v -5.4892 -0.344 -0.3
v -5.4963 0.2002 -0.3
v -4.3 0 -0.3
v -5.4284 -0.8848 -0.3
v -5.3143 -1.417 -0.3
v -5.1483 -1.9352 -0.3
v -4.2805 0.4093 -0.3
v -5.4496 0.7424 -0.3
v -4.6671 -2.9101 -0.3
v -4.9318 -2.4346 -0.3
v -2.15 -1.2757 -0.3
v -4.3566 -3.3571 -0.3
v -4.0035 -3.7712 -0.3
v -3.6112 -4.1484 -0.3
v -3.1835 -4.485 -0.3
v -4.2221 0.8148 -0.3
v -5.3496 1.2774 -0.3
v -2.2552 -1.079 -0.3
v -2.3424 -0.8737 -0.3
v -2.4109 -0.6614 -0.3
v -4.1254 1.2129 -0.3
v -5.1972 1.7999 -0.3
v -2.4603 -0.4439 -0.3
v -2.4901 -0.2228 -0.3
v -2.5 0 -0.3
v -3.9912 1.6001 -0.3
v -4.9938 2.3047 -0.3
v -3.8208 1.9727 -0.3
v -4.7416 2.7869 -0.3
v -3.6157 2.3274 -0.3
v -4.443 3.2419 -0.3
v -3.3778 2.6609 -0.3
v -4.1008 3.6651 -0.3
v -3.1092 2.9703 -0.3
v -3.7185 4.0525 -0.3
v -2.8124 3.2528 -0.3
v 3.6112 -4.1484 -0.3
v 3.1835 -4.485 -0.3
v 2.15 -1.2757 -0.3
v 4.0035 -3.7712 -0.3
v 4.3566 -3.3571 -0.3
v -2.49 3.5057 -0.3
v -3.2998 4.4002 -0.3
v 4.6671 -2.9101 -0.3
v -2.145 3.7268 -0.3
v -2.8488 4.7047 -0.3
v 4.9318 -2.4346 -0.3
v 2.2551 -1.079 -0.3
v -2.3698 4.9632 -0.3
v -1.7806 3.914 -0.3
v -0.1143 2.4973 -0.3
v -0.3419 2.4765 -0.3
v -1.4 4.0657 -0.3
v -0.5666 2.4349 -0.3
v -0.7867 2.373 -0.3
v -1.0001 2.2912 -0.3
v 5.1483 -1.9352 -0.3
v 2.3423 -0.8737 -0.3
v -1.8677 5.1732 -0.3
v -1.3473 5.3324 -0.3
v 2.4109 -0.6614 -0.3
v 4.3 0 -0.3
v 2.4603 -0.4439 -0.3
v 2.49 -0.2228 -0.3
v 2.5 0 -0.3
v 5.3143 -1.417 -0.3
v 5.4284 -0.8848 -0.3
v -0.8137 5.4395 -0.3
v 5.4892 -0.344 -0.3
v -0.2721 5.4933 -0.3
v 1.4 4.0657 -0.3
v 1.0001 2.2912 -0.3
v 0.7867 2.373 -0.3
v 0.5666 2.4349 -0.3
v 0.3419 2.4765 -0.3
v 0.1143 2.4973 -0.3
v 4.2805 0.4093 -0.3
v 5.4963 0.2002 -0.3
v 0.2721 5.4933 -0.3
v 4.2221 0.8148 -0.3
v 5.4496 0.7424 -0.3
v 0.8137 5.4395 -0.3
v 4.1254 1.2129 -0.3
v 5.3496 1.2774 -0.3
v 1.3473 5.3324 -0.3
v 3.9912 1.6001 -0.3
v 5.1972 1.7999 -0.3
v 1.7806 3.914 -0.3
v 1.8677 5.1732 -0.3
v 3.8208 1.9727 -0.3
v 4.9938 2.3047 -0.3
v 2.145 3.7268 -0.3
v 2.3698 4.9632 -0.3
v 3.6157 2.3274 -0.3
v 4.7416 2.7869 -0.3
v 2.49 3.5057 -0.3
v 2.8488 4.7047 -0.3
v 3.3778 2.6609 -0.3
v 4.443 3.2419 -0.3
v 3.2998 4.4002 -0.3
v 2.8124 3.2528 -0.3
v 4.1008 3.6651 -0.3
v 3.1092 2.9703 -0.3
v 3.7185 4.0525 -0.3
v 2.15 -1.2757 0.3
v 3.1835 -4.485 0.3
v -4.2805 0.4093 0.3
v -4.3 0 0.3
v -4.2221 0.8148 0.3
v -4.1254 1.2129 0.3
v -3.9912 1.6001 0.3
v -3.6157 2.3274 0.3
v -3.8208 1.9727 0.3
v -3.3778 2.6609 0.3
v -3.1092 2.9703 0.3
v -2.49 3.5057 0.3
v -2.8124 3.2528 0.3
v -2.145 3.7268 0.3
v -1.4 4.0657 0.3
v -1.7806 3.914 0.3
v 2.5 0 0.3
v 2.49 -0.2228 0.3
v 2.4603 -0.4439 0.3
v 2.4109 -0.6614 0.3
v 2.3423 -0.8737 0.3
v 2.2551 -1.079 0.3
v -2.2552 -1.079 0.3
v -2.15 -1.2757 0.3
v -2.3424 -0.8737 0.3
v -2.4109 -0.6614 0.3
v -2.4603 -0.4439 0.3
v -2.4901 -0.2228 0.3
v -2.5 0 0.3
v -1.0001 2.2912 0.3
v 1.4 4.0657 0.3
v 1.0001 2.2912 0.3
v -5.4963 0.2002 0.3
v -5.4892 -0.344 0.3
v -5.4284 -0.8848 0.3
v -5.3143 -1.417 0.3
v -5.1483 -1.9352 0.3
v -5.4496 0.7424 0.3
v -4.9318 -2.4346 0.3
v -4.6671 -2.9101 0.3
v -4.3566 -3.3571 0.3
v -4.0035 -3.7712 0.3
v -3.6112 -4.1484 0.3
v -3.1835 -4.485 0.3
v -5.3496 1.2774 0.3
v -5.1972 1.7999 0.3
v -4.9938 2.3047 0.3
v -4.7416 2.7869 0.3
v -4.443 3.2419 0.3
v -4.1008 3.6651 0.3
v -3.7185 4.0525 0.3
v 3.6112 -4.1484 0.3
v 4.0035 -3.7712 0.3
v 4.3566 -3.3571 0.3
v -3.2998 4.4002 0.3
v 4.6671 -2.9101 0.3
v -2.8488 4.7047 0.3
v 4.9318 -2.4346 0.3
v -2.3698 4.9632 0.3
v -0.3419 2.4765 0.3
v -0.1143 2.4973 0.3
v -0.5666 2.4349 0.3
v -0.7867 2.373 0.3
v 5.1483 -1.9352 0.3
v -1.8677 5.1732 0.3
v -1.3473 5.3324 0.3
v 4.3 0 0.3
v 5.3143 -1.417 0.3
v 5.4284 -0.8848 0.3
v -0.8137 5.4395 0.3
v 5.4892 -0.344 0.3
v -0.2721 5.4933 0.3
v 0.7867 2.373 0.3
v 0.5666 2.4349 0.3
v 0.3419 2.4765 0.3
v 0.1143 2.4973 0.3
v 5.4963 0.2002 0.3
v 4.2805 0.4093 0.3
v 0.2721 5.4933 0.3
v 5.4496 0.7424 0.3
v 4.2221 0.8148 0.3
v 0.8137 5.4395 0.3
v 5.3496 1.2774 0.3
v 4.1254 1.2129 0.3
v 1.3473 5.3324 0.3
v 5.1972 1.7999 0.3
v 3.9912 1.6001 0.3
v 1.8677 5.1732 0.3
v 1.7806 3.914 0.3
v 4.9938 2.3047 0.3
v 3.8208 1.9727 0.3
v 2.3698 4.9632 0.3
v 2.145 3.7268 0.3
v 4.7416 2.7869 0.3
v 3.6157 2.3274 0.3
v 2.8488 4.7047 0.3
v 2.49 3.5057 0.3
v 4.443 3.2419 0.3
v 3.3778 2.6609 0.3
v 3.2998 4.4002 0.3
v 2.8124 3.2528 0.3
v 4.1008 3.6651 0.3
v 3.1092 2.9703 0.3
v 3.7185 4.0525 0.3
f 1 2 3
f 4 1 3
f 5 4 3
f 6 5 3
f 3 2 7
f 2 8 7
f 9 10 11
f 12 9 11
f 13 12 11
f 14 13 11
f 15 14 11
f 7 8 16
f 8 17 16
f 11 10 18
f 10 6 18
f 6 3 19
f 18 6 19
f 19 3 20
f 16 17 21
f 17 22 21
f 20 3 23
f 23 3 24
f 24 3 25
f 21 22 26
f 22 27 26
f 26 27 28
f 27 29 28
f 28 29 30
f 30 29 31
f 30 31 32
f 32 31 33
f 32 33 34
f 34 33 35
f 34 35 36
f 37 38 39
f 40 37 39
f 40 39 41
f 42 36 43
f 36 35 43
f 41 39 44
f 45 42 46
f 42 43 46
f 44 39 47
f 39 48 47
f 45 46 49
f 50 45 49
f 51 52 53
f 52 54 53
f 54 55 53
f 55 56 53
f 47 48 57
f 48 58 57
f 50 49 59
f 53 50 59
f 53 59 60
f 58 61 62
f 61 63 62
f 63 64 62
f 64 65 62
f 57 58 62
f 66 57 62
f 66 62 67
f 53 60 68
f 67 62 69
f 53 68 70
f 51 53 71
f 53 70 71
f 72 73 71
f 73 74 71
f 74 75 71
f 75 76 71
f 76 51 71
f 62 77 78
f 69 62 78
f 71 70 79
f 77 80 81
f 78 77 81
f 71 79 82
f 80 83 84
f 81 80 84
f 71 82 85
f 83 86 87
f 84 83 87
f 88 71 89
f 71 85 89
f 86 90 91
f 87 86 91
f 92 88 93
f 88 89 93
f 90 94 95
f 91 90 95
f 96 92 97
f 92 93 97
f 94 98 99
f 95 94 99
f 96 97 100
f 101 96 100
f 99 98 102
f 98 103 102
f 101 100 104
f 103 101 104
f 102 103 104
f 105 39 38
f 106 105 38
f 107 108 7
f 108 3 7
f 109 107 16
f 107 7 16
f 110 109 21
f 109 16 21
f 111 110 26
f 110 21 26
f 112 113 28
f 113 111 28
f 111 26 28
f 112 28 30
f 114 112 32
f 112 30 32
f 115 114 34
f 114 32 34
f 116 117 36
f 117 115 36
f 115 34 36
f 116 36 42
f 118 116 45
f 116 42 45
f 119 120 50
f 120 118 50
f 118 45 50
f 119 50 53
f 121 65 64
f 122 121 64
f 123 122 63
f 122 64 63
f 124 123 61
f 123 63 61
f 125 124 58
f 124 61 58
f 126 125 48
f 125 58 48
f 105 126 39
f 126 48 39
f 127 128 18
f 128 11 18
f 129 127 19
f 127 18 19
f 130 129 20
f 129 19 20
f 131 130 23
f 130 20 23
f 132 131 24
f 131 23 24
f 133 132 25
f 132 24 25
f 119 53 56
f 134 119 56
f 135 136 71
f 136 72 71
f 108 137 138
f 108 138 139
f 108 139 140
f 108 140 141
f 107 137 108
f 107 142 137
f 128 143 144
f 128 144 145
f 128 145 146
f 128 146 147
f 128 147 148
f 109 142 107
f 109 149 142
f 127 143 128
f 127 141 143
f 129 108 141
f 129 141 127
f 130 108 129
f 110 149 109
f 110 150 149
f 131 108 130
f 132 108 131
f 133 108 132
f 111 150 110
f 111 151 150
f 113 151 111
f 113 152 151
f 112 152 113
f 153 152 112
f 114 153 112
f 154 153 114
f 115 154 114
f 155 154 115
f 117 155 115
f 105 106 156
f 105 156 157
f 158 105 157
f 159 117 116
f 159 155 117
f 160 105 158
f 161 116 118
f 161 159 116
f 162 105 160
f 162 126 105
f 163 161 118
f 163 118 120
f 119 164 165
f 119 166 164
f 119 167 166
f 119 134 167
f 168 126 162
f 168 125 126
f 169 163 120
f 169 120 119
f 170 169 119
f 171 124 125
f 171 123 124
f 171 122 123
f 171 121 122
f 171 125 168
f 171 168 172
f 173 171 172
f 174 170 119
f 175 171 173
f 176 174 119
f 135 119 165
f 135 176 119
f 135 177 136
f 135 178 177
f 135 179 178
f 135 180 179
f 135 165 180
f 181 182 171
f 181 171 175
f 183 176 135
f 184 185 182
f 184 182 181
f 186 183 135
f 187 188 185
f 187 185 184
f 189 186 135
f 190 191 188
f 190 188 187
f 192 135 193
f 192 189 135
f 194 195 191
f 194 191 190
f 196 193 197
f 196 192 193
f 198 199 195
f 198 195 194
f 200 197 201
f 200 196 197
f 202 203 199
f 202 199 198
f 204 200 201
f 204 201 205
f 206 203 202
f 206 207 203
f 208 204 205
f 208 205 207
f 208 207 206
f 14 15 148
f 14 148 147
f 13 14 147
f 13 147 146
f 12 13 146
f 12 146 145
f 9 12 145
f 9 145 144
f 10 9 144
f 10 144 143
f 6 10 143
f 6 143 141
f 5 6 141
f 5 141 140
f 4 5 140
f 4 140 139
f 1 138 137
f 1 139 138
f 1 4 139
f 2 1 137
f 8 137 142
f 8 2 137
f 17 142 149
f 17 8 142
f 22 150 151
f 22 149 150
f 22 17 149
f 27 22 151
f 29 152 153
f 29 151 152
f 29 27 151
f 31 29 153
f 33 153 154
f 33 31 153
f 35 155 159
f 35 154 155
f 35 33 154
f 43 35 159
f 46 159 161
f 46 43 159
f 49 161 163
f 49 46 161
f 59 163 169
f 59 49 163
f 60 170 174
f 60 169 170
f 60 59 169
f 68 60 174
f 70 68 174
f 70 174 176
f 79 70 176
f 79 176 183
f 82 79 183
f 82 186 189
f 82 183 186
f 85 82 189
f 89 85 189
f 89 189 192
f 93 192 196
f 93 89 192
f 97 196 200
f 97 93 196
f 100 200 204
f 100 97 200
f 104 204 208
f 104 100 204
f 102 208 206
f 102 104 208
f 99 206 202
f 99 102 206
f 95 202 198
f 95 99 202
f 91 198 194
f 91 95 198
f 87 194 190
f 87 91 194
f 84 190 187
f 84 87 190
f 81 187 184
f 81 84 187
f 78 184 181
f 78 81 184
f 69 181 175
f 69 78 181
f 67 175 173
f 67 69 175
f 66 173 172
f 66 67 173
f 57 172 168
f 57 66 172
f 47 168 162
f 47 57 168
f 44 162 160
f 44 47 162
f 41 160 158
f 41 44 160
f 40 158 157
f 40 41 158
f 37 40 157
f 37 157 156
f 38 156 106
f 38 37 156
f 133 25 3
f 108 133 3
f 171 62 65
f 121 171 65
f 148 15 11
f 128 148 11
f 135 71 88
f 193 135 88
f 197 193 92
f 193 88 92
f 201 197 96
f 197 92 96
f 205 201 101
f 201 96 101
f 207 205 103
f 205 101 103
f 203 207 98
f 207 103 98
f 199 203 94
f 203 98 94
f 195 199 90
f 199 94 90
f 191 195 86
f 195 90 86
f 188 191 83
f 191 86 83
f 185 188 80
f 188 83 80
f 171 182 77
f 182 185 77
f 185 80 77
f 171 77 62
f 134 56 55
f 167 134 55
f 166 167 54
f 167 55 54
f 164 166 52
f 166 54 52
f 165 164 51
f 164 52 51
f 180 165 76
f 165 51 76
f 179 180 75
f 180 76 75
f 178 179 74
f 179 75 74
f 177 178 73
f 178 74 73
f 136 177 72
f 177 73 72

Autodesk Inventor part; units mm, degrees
sketch "Sketch_1" plane through (0, 0, 0) normal (0, 0, 1) x (1, 0, 0)
  arc A0 (3.1835, -4.485) -> (-3.1835, -4.485) centre (0, 0) ccw
  line L0 (-3.1835, -4.485) -> (-2.15, -1.2757)
  arc A1 (-2.5, 0) -> (-2.15, -1.2757) centre (0, 0) ccw
  line L1 (-2.5, 0) -> (-4.3, 0)
  arc A2 (-1.4, 4.0657) -> (-4.3, 0) centre (0, 0) ccw
  line L2 (-1.4, 4.0657) -> (-1.0001, 2.2912)
  arc A3 (1.0001, 2.2912) -> (-1.0001, 2.2912) centre (0, 0) ccw
  line L3 (1.0001, 2.2912) -> (1.4, 4.0657)
  arc A4 (4.3, 0) -> (1.4, 4.0657) centre (0, 0) ccw
  line L4 (4.3, 0) -> (2.5, 0)
  arc A5 (2.15, -1.2757) -> (2.5, 0) centre (0, 0) ccw
  line L5 (2.15, -1.2757) -> (3.1835, -4.485)
extrude "Extrusion1" add sketch "Sketch_1" along normal mid plane 0.6
ref_plane "COMBINATION_MODULE_XY" through (0, 0, 0.3) normal (0, 0, 1) x (1, 0, 0)
ref_plane "COMBINATION_MODULE_YZ" through (0, 0, 0.3) normal (1, 0, 0) x (0, 1, 0)
ref_plane "COMBINATION_MODULE_ZX" through (0, 0, 0.3) normal (0, 1, 0) x (0, 0, 1)
ref_plane "ring_to_screw_XY" through (0, 0, 0) normal (0, 0, 1) x (1, 0, 0)
ref_plane "ring_to_screw_YZ" through (0, 0, 0) normal (1, 0, 0) x (0, 1, 0)
ref_plane "ring_to_screw_ZX" through (0, 0, 0) normal (0, 1, 0) x (0, 0, 1)
properties part number "NETW5"
